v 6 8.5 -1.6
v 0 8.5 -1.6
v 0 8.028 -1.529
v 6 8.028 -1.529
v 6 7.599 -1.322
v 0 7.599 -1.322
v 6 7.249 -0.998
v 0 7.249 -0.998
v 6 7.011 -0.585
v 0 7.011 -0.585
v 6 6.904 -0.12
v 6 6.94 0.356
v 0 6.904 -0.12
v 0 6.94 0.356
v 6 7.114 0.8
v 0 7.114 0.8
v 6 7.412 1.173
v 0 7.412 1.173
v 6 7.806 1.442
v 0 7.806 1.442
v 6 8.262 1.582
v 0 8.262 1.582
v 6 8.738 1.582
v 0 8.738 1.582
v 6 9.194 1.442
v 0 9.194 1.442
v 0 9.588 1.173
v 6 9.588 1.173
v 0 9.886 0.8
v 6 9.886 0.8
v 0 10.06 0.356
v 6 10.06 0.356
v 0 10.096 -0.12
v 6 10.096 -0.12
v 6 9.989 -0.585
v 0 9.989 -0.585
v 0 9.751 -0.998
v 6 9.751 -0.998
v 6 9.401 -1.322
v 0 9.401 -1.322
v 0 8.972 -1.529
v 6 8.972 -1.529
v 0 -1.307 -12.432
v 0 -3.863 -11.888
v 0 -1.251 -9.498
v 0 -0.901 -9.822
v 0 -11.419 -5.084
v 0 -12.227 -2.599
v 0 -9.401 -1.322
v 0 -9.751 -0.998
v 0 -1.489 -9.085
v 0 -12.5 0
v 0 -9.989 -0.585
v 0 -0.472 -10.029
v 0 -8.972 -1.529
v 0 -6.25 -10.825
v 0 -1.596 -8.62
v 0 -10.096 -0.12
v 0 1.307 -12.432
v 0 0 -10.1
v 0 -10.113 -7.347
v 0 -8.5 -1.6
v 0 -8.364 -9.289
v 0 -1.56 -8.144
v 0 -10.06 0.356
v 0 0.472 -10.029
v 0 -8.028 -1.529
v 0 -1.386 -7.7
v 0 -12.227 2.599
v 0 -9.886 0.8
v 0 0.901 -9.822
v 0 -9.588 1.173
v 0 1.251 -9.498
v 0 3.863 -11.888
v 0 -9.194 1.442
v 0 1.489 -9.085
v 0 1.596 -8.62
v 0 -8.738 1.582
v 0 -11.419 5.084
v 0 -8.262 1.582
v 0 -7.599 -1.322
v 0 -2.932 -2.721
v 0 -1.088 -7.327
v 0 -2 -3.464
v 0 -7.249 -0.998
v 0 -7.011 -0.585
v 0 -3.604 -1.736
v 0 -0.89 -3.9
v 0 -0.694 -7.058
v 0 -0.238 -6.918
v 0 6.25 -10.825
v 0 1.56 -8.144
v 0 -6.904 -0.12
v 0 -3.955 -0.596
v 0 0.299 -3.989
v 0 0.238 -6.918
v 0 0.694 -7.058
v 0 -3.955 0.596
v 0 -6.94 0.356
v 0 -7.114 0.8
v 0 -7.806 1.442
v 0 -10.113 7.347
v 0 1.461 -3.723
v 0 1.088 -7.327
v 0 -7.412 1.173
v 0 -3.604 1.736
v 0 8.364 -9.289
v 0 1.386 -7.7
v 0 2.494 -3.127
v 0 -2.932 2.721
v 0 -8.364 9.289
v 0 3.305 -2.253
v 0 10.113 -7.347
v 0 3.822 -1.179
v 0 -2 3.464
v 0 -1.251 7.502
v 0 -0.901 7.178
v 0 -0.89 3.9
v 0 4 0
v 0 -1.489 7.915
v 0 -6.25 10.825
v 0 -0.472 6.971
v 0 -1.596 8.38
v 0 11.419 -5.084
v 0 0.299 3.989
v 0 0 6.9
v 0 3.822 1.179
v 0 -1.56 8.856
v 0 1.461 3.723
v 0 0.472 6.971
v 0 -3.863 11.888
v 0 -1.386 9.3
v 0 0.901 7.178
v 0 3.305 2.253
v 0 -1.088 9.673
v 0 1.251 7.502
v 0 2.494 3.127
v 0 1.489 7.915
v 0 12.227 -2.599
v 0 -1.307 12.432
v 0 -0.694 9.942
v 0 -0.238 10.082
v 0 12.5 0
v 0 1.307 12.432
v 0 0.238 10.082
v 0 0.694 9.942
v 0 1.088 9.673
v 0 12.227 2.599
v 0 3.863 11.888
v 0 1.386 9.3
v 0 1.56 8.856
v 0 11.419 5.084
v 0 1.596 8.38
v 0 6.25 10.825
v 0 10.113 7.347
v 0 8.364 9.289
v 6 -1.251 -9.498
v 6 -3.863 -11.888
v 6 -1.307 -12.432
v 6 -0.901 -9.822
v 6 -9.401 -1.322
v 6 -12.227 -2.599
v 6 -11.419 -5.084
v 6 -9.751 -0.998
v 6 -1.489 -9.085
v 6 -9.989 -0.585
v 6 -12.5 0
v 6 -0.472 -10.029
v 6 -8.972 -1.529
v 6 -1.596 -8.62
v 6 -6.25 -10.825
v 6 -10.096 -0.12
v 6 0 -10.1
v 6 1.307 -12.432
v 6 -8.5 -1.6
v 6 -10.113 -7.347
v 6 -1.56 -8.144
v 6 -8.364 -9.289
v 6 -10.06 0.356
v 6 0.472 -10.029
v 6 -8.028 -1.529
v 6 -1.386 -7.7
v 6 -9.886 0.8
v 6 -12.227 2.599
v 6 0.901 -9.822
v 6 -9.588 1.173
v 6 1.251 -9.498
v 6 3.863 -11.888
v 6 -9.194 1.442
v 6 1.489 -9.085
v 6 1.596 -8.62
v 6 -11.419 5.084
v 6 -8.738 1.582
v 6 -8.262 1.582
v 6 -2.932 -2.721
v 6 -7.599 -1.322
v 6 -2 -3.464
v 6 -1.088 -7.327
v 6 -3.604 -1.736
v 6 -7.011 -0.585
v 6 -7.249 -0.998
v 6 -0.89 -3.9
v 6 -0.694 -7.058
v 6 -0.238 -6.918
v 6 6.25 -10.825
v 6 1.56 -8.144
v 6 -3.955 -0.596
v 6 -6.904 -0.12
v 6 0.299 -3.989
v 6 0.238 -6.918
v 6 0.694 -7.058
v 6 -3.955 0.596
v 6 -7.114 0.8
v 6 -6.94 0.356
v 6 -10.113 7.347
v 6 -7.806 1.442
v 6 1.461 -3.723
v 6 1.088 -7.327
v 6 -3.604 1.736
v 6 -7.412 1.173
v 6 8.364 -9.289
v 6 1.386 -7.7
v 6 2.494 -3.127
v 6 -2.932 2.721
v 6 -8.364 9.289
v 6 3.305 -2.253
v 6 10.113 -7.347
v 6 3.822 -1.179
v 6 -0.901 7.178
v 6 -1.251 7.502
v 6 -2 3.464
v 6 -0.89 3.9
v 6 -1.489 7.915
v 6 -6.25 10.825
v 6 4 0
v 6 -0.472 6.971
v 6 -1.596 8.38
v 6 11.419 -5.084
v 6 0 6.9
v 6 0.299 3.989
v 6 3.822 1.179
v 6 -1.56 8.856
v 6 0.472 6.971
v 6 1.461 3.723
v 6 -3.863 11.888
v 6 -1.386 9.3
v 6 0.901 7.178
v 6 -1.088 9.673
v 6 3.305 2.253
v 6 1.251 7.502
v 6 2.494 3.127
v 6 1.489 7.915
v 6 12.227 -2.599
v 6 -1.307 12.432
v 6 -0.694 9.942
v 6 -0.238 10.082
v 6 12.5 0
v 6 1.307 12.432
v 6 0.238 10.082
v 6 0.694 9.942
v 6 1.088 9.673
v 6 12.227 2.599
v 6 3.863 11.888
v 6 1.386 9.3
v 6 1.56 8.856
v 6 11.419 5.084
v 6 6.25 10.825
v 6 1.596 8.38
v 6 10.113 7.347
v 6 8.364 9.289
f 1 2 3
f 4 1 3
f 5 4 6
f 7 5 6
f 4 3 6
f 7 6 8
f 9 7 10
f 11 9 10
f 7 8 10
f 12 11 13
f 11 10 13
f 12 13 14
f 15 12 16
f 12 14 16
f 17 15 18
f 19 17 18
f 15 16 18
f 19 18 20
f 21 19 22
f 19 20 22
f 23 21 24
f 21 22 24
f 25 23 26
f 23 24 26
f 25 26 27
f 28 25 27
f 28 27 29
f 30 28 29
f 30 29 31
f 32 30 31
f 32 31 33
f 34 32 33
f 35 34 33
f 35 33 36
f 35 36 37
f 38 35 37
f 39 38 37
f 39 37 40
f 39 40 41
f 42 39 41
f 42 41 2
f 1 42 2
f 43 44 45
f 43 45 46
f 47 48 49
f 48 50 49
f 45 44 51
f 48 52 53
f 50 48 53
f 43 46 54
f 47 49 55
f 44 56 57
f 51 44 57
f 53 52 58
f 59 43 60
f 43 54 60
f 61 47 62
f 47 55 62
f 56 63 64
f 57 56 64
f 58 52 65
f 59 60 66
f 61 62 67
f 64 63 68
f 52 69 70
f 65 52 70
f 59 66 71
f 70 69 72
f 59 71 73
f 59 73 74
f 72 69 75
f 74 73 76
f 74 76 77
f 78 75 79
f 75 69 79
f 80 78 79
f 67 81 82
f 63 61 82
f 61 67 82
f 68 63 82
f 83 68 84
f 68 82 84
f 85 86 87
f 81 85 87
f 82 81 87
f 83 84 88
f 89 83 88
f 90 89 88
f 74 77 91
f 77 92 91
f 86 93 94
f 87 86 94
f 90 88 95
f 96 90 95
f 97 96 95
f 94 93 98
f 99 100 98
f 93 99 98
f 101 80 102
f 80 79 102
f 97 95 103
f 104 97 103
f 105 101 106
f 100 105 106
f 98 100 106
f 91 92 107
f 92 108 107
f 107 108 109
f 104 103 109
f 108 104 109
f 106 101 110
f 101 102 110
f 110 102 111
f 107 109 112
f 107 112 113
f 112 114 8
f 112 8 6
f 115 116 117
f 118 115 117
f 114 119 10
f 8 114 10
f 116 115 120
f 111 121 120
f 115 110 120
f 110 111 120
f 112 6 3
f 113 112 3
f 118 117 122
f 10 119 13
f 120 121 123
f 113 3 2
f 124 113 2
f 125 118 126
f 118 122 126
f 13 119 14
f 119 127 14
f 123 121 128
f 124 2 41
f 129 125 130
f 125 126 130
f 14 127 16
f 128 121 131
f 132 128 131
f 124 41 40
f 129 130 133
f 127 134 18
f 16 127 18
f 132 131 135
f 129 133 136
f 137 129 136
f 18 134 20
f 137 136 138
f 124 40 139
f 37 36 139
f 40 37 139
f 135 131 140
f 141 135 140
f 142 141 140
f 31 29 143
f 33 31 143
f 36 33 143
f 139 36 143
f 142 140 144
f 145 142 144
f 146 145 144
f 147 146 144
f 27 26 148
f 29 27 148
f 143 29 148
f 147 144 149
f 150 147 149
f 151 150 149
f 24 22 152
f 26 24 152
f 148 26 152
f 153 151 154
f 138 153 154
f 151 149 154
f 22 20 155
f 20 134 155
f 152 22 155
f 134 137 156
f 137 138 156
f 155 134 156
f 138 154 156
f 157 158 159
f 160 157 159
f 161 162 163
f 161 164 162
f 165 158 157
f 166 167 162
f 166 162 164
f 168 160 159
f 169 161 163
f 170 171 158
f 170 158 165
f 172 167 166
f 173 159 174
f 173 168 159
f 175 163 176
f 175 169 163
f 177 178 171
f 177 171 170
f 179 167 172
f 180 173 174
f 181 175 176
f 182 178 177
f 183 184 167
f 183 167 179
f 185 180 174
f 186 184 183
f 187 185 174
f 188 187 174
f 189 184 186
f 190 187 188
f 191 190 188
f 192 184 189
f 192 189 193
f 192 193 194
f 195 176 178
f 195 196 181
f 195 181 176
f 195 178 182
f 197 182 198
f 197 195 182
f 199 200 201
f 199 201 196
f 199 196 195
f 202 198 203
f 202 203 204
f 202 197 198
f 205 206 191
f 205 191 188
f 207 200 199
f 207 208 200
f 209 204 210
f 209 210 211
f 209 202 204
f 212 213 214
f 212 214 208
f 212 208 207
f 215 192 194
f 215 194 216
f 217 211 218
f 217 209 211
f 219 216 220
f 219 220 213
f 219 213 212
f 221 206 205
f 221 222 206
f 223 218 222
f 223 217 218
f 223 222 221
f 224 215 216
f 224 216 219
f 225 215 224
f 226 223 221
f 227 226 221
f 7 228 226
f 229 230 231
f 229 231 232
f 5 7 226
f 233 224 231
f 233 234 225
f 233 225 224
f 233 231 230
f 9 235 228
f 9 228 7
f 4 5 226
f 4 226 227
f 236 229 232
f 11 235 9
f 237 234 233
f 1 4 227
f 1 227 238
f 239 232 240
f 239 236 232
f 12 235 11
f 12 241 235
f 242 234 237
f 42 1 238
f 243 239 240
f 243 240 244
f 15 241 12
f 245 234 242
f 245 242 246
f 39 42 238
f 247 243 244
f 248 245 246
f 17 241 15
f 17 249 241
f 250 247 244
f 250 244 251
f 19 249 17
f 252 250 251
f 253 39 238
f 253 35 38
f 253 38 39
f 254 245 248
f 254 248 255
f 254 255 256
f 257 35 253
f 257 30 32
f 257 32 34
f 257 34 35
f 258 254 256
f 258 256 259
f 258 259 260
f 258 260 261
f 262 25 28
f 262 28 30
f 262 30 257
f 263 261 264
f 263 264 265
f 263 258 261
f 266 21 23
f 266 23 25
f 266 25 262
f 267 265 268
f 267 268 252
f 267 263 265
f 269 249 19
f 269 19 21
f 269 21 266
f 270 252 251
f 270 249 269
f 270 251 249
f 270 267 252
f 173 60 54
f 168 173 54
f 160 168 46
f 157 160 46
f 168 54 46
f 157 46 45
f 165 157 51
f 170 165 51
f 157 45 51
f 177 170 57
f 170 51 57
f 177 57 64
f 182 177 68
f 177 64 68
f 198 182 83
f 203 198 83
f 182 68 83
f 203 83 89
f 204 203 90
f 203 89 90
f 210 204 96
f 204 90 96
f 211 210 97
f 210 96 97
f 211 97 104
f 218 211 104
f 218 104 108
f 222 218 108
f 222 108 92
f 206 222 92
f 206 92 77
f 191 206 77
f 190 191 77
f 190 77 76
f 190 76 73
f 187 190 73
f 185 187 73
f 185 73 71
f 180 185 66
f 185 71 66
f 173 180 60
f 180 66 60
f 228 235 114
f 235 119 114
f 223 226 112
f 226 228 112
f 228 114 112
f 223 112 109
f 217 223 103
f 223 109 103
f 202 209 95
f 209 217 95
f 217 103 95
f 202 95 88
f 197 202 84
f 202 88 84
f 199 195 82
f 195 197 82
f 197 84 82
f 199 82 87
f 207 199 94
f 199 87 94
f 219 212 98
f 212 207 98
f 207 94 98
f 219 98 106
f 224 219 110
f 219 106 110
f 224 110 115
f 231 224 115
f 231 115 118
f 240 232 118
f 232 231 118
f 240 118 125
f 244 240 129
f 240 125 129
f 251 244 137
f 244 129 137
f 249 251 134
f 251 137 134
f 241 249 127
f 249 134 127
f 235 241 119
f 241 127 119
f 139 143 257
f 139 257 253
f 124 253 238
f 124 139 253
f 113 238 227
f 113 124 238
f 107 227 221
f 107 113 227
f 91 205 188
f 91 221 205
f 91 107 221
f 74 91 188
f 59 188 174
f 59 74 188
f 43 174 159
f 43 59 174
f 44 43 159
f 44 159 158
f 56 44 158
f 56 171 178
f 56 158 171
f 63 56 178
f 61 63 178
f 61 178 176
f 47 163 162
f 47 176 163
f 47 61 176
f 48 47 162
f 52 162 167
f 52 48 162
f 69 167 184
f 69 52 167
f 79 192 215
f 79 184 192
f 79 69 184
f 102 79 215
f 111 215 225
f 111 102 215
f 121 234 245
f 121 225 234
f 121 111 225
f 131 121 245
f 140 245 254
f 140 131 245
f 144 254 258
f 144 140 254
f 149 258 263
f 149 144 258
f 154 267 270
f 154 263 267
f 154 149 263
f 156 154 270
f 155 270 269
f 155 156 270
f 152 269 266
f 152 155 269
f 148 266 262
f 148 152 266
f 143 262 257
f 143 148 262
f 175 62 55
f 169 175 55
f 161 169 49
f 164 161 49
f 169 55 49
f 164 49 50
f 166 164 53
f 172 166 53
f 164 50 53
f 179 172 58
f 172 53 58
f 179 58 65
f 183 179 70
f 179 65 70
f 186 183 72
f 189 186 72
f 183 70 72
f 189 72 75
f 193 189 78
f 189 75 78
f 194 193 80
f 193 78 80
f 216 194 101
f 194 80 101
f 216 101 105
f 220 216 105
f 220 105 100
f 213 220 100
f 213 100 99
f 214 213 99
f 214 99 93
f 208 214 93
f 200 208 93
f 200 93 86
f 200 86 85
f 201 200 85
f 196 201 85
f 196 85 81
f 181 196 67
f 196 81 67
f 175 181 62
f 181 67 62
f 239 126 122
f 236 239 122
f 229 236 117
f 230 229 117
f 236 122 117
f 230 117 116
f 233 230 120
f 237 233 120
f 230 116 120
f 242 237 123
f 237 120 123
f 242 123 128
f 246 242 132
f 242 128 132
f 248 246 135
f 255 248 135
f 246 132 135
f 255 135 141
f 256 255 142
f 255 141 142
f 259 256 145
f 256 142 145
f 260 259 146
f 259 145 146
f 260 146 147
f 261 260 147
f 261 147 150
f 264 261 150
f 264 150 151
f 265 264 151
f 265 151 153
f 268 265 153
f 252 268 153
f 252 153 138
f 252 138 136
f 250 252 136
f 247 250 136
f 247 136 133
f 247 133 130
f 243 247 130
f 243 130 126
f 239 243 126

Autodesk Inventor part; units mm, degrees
ref_plane "YZ Plane" through (0, 0, 0) normal (1, 0, 0) x (0, 1, 0)
ref_plane "XZ Plane" through (0, 0, 0) normal (0, 1, 0) x (-1, 0, 0)
ref_plane "XY Plane" through (0, 0, 0) normal (0, 0, 1) x (1, 0, 0)
sketch "スケッチ1" plane through (0, 0, 0) normal (0, 0, 1) x (1, 0, 0)
  point P0 (0, 0)
sketch "スケッチ2" plane through (0, 0, 0) normal (1, 0, 0) x (0, 1, 0)
  circle A0 centre (0, 0) radius 12.5
  circle A1 centre (0, 0) radius 4
  dimension "d0" = 25
  dimension "d1" = 8
extrude "押し出し1" add sketch "スケッチ2" along normal blind 6
sketch "スケッチ3" plane through (6, 0, 0) normal (1, 0, 0) x (0, 0, -1)
  circle A0 centre (0, 0) radius 8.5 construction
  circle A1 centre (0, 8.5) radius 1.6
  circle A2 centre (-8.5, 0) radius 1.6
  circle A3 centre (0, -8.5) radius 1.6
  circle A4 centre (8.5, 0) radius 1.6
  dimension "d4" = 17
  dimension "d5" = 3.2
  dimension "d6" = 3.2
  dimension "d7" = 3.2
  dimension "d8" = 3.2
hole "穴1" at (6, 8.5, 0) at (6, 0, 8.5) at (6, -8.5, 0) at (6, 0, -8.5) direction (-1, 0, 0) diameter 3.2 end through all
properties part number "NHK_t0_7"
